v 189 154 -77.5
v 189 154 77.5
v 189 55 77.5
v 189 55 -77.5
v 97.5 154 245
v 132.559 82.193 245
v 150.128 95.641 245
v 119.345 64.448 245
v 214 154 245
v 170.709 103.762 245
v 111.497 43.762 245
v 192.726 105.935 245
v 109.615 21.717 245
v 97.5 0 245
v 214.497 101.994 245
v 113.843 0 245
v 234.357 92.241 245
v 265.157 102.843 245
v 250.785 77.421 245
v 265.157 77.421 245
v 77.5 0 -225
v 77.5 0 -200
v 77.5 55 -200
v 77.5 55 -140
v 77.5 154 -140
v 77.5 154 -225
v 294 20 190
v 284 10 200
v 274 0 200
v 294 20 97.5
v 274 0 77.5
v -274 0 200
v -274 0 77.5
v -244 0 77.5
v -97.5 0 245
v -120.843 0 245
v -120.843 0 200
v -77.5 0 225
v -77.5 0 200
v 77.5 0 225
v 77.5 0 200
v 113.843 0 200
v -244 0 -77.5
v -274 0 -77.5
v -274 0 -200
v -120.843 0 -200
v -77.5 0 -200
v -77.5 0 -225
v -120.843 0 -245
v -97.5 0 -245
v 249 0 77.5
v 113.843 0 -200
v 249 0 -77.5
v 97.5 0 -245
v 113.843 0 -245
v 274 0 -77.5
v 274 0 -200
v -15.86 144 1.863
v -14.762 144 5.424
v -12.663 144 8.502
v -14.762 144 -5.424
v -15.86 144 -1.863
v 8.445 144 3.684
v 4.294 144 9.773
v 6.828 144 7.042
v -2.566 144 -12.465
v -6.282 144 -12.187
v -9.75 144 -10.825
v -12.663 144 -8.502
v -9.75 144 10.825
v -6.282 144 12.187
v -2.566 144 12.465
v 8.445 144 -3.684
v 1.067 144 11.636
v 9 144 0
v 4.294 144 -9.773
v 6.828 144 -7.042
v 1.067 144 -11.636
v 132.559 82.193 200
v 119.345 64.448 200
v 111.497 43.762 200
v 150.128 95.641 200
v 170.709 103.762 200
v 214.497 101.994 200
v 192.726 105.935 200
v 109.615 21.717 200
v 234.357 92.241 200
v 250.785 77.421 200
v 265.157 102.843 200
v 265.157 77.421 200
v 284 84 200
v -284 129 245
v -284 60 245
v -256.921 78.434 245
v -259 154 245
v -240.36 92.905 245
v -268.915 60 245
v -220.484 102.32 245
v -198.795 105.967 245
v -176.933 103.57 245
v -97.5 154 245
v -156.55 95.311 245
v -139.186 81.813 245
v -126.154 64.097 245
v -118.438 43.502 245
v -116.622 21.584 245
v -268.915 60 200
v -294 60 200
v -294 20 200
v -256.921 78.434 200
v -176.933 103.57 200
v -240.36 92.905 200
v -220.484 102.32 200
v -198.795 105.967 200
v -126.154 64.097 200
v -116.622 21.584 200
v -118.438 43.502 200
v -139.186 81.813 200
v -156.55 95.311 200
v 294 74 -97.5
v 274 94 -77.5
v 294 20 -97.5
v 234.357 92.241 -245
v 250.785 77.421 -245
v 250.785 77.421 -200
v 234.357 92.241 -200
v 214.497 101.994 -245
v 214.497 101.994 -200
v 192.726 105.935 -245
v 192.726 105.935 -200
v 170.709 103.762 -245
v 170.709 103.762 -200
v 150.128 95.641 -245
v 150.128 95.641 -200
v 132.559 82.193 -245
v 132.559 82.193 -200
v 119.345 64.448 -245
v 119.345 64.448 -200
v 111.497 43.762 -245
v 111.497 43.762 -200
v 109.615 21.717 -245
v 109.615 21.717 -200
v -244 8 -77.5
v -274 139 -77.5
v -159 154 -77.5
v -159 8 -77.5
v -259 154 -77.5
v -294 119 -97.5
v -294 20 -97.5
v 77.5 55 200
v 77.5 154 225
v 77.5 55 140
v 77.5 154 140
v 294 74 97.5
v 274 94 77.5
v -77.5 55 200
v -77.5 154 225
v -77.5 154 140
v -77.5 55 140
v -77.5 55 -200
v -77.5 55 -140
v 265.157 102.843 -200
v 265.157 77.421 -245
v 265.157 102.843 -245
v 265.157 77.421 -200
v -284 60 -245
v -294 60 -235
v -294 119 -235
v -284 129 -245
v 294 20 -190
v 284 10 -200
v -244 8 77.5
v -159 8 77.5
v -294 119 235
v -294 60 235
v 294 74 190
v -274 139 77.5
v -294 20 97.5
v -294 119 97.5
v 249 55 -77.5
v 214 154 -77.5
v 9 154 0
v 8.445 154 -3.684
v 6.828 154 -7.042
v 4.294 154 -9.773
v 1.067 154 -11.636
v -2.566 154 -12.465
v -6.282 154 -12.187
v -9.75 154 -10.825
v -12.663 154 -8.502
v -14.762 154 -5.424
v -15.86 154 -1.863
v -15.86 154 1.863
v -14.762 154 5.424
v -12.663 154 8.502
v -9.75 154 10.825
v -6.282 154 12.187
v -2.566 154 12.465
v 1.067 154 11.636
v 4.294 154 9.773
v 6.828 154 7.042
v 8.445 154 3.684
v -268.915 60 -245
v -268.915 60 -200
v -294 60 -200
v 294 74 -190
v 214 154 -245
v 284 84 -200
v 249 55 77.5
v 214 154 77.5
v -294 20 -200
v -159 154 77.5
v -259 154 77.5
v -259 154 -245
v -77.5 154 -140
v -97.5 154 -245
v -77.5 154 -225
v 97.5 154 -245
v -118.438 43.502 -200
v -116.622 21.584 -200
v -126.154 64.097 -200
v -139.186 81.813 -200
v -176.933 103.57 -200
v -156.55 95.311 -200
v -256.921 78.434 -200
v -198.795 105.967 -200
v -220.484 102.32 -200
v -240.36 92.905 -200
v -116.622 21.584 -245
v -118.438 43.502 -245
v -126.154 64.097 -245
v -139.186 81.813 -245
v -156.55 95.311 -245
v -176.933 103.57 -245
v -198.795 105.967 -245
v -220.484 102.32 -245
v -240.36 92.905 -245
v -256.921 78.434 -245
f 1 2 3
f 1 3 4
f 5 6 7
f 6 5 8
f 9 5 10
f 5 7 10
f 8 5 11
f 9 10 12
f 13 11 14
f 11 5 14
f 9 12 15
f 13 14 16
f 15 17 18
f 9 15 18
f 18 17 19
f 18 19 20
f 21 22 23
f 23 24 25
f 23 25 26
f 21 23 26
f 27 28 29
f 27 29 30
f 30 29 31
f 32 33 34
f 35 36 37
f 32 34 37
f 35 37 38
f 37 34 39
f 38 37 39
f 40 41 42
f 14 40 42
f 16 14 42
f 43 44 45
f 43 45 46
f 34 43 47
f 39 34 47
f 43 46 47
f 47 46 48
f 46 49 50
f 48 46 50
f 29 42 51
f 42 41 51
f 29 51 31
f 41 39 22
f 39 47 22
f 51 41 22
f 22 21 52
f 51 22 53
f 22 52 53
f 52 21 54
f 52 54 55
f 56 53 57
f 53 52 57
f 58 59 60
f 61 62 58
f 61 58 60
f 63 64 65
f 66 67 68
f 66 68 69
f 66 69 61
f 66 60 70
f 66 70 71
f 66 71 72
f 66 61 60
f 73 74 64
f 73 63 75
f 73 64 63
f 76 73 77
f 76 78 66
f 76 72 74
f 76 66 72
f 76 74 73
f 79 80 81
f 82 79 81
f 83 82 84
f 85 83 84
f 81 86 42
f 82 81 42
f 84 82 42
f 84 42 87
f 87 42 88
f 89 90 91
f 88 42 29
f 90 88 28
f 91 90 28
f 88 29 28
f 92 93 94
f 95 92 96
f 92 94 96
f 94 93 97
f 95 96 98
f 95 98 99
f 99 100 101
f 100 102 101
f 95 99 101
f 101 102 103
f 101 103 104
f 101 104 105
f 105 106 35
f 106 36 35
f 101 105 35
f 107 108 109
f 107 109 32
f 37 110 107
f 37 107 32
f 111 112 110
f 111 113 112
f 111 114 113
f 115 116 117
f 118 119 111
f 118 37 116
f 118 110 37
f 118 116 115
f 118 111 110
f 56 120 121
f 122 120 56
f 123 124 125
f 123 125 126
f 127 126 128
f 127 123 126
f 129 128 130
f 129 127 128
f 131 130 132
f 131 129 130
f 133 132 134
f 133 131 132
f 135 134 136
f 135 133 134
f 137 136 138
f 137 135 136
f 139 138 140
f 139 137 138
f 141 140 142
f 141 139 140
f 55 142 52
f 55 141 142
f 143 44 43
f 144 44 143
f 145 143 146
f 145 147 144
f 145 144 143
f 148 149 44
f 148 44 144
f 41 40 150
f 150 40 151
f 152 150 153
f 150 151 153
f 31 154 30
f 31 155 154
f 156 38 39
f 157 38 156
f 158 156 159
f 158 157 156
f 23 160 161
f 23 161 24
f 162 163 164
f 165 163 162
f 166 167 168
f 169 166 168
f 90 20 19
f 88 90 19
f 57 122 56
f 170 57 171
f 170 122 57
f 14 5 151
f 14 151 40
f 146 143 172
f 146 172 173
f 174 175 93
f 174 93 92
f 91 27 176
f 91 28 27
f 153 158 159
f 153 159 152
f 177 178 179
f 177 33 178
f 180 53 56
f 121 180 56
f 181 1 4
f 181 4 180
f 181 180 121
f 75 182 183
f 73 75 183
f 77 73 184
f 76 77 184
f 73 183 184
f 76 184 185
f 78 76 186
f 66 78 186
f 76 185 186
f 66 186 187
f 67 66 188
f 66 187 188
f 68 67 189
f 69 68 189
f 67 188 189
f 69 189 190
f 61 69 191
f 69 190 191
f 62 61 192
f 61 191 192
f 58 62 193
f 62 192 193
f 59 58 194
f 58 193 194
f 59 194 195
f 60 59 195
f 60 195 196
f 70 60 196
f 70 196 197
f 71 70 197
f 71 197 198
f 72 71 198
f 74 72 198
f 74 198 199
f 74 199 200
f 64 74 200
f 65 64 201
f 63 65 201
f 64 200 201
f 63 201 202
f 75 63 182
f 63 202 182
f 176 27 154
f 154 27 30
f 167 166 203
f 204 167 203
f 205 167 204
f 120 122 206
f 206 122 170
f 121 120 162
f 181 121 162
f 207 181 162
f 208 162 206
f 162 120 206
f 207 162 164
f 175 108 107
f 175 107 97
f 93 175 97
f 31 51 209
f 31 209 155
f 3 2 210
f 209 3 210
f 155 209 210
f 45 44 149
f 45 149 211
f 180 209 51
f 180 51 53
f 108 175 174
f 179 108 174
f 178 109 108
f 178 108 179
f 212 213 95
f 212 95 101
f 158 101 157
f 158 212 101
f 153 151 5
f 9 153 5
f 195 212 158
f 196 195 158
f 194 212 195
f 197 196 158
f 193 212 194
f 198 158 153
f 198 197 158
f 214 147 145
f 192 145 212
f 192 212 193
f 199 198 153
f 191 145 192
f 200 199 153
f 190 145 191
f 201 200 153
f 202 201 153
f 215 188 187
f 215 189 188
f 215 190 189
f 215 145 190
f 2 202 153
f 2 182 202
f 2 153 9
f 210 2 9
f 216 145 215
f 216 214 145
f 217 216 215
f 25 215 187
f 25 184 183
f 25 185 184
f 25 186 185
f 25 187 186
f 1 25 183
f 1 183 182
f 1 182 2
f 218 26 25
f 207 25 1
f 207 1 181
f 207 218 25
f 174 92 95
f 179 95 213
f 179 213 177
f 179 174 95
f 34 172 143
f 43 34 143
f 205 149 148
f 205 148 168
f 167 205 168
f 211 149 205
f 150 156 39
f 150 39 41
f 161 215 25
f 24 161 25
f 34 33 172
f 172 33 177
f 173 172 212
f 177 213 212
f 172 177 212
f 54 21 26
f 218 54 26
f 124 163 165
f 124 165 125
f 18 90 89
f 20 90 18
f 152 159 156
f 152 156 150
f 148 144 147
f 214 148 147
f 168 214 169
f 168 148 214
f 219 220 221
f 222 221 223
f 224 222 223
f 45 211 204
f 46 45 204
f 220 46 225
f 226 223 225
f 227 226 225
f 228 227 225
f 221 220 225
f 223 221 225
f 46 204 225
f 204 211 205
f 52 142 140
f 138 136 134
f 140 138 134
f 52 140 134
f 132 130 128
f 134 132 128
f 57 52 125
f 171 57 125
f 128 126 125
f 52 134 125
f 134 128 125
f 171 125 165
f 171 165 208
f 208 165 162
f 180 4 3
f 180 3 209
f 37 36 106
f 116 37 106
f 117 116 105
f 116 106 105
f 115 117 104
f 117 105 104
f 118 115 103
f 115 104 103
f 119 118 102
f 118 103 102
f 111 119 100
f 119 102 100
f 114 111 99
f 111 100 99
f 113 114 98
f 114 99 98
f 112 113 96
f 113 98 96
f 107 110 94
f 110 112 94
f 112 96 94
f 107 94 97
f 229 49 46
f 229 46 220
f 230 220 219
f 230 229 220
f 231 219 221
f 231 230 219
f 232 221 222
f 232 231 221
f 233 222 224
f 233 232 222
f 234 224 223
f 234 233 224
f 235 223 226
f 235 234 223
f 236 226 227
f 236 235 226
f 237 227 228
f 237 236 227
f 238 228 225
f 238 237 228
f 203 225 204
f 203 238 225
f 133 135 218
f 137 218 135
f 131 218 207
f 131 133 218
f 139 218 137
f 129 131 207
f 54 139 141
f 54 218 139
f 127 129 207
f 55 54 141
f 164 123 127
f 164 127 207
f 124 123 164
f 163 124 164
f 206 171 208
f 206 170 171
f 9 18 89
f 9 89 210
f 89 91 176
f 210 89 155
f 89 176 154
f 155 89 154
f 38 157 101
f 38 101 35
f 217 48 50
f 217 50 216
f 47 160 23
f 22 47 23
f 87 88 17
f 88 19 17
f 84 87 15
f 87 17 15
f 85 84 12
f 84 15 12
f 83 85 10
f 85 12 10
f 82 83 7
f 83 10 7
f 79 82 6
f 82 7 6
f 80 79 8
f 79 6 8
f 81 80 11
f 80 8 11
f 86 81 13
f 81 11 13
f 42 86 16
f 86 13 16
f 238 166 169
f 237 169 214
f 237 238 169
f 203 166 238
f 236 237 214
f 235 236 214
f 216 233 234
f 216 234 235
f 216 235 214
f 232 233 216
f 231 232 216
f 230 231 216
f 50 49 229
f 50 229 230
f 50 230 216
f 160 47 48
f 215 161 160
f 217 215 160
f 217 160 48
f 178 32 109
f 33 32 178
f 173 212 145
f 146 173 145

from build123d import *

# Parameters (mm, degrees)
SKETCH_1_W          = 588
SKETCH_1_H          = 490
EXTRUDE_1_DEPTH     = 154
SKETCH_2_R          = 80
CUT_EXTRUDE_1_DEPTH = 45
SKETCH_3_W          = 155
SKETCH_3_H          = 105
SKETCH_3_W_2        = 105
SKETCH_3_H_2        = 155
SKETCH_3_W_3        = 135
CUT_EXTRUDE_2_DEPTH = 99
CHAMFER_1_SIZE      = 80
SKETCH_4_W          = 45
SKETCH_4_H          = 155
SKETCH_4_W_2        = 155
SKETCH_4_H_2        = 45
SKETCH_4_W_3        = 50
CUT_EXTRUDE_3_DEPTH = 56
CHAMFER_2_SIZE      = 20
CHAMFER_3_SIZE      = 35
SKETCH_5_W          = 85
SKETCH_5_H          = 155
CUT_EXTRUDE_4_DEPTH = 47
SKETCH_6_R          = 12.5
CUT_EXTRUDE_5_DEPTH = 10
CHAMFER_4_SIZE      = 10
SKETCH_7_W          = 28.842878722
SKETCH_7_H          = 45
CUT_EXTRUDE_6_DEPTH = 155
CHAMFER_6_SIZE      = 10
CUT_EXTRUDE_7_DEPTH = 45
CUT_EXTRUDE_START   = -490
CUT_EXTRUDE_8_DEPTH = 45
SKETCH_9_W          = 45
SKETCH_9_H          = 60
CUT_EXTRUDE_9_DEPTH = 50
CHAMFER_7_SIZE      = 20


with BuildPart() as part:
    # 草图1 → 凸台-拉伸1 (new body)
    with BuildSketch(Plane(origin=(0, 0, 0), x_dir=(1, 0, 0), z_dir=(0, 1, 0))):
        Rectangle(SKETCH_1_W, SKETCH_1_H)
    extrude(amount=EXTRUDE_1_DEPTH)

    # 草图2 → 切除-拉伸1 (cut)
    with BuildSketch(Plane.XY.offset(245)):
        with Locations((-196.5, 26)):
            Circle(SKETCH_2_R)
        with Locations((189.5, 26)):
            Circle(SKETCH_2_R)
    cut_extrude_1 = extrude(amount=-CUT_EXTRUDE_1_DEPTH, mode=Mode.SUBTRACT)

    # 镜向1: 切除-拉伸1 across plane
    add(cut_extrude_1.mirror(Plane.XY), mode=Mode.SUBTRACT)

    # 草图3 → 切除-拉伸2 (cut)
    with BuildSketch(Plane(origin=(0, 154, 0), x_dir=(1, 0, 0), z_dir=(0, 1, 0))):
        with Locations((0, -192.5)):
            Rectangle(SKETCH_3_W, SKETCH_3_H)
        with Locations((241.5, 0)):
            Rectangle(SKETCH_3_W_2, SKETCH_3_H_2)
        with Locations((0, 192.5)):
            Rectangle(SKETCH_3_W, SKETCH_3_H)
        with Locations((-226.5, 0)):
            Rectangle(SKETCH_3_W_3, SKETCH_3_H_2)
    extrude(amount=-CUT_EXTRUDE_2_DEPTH, mode=Mode.SUBTRACT)

    # 倒角1
    chamfer_1_edges = [part.edges().sort_by_distance(p)[0] for p in [
        (294, 154, 161.25),
        (294, 154, -161.25),
    ]]
    chamfer(chamfer_1_edges, length=CHAMFER_1_SIZE)

    # 草图4 → 切除-拉伸3 (cut, through all)
    with BuildSketch(Plane(origin=(0, 55, 0), x_dir=(1, 0, 0), z_dir=(0, 1, 0))):
        with Locations((271.5, 0)):
            Rectangle(SKETCH_4_W, SKETCH_4_H)
        with Locations((0, 222.5)):
            Rectangle(SKETCH_4_W_2, SKETCH_4_H_2)
        with Locations((0, -222.5)):
            Rectangle(SKETCH_4_W_2, SKETCH_4_H_2)
        with Locations((-269, 0)):
            Rectangle(SKETCH_4_W_3, SKETCH_4_H)
    extrude(amount=-CUT_EXTRUDE_3_DEPTH, mode=Mode.SUBTRACT)

    # 倒角2
    chamfer_2_edges = [part.edges().sort_by_distance(p)[0] for p in [
        (294, 37, -77.5),
        (294, 37, 77.5),
        (77.5, 77, -245),
        (-77.5, 77, -245),
        (77.5, 77, 245),
        (-77.5, 77, 245),
        (-294, 77, 77.5),
        (-294, 77, -77.5),
    ]]
    chamfer(chamfer_2_edges, length=CHAMFER_2_SIZE)

    # 倒角3
    chamfer_3_edges = [part.edges().sort_by_distance(p)[0] for p in [
        (-294, 154, 171.25),
        (-294, 154, -171.25),
    ]]
    chamfer(chamfer_3_edges, length=CHAMFER_3_SIZE)

    # 草图5 → 切除-拉伸4 (cut)
    with BuildSketch(Plane(origin=(0, 55, 0), x_dir=(1, 0, 0), z_dir=(0, 1, 0))):
        with Locations((-201.5, 0)):
            Rectangle(SKETCH_5_W, SKETCH_5_H)
    extrude(amount=-CUT_EXTRUDE_4_DEPTH, mode=Mode.SUBTRACT)

    # 草图6 → 切除-拉伸5 (cut)
    with BuildSketch(Plane(origin=(0, 154, 0), x_dir=(1, 0, 0), z_dir=(0, 1, 0))):
        with Locations((-3.5, 0)):
            Circle(SKETCH_6_R)
    extrude(amount=-CUT_EXTRUDE_5_DEPTH, mode=Mode.SUBTRACT)

    # 倒角4
    chamfer_4_edges = [part.edges().sort_by_distance(p)[0] for p in [
        (-294, 59.5, 245),
        (-294, 59.5, -245),
    ]]
    chamfer(chamfer_4_edges, length=CHAMFER_4_SIZE)

    # 草图7 → 切除-拉伸6 (cut, through all)
    with BuildSketch(Plane.XZ):
        with Locations((279.578560639, 222.5)):
            Rectangle(SKETCH_7_W, SKETCH_7_H)
        with Locations((279.578560639, -222.5)):
            Rectangle(SKETCH_7_W, SKETCH_7_H)
    extrude(amount=-CUT_EXTRUDE_6_DEPTH, mode=Mode.SUBTRACT)

    # 倒角6
    chamfer_6_edges = [part.edges().sort_by_distance(p)[0] for p in [
        (294, 37, 200),
        (294, 37, -200),
    ]]
    chamfer(chamfer_6_edges, length=CHAMFER_6_SIZE)

    # 草图8 → 切除-拉伸7 (cut)
    with BuildSketch(Plane.XY.offset(245)):
        with BuildLine():
            Line((265.157121278, 77.421439361), (250.78487231, 77.421439361))
            ThreePointArc((250.78487231, 77.421439361), (259.140791184, 65.372073901), (265.157121278, 52))
            Line((265.157121278, 52), (265.157121278, 77.421439361))
        make_face()
    extrude(amount=-CUT_EXTRUDE_7_DEPTH, mode=Mode.SUBTRACT)

    # 草图8<2> → 切除-拉伸8 (cut)
    with BuildSketch(Plane.XY.offset(245).offset(CUT_EXTRUDE_START)):
        with BuildLine():
            Line((265.157121278, 77.421439361), (250.78487231, 77.421439361))
            ThreePointArc((250.78487231, 77.421439361), (259.140791184, 65.372073901), (265.157121278, 52))
            Line((265.157121278, 52), (265.157121278, 77.421439361))
        make_face()
    extrude(amount=CUT_EXTRUDE_8_DEPTH, mode=Mode.SUBTRACT)

    # 草图9 → 切除-拉伸9 (cut)
    with BuildSketch(Plane.ZY.offset(294)):
        with Locations((222.5, 30)):
            Rectangle(SKETCH_9_W, SKETCH_9_H)
        with Locations((-222.5, 30)):
            Rectangle(SKETCH_9_W, SKETCH_9_H)
    extrude(amount=-CUT_EXTRUDE_9_DEPTH, mode=Mode.SUBTRACT)

    # 倒角7
    chamfer_7_edges = [part.edges().sort_by_distance(p)[0] for p in [
        (-294, 0, -148.75),
        (-294, 0, 148.75),
        (294, 0, -143.75),
        (294, 0, 143.75),
    ]]
    chamfer(chamfer_7_edges, length=CHAMFER_7_SIZE)


solid = part.part
